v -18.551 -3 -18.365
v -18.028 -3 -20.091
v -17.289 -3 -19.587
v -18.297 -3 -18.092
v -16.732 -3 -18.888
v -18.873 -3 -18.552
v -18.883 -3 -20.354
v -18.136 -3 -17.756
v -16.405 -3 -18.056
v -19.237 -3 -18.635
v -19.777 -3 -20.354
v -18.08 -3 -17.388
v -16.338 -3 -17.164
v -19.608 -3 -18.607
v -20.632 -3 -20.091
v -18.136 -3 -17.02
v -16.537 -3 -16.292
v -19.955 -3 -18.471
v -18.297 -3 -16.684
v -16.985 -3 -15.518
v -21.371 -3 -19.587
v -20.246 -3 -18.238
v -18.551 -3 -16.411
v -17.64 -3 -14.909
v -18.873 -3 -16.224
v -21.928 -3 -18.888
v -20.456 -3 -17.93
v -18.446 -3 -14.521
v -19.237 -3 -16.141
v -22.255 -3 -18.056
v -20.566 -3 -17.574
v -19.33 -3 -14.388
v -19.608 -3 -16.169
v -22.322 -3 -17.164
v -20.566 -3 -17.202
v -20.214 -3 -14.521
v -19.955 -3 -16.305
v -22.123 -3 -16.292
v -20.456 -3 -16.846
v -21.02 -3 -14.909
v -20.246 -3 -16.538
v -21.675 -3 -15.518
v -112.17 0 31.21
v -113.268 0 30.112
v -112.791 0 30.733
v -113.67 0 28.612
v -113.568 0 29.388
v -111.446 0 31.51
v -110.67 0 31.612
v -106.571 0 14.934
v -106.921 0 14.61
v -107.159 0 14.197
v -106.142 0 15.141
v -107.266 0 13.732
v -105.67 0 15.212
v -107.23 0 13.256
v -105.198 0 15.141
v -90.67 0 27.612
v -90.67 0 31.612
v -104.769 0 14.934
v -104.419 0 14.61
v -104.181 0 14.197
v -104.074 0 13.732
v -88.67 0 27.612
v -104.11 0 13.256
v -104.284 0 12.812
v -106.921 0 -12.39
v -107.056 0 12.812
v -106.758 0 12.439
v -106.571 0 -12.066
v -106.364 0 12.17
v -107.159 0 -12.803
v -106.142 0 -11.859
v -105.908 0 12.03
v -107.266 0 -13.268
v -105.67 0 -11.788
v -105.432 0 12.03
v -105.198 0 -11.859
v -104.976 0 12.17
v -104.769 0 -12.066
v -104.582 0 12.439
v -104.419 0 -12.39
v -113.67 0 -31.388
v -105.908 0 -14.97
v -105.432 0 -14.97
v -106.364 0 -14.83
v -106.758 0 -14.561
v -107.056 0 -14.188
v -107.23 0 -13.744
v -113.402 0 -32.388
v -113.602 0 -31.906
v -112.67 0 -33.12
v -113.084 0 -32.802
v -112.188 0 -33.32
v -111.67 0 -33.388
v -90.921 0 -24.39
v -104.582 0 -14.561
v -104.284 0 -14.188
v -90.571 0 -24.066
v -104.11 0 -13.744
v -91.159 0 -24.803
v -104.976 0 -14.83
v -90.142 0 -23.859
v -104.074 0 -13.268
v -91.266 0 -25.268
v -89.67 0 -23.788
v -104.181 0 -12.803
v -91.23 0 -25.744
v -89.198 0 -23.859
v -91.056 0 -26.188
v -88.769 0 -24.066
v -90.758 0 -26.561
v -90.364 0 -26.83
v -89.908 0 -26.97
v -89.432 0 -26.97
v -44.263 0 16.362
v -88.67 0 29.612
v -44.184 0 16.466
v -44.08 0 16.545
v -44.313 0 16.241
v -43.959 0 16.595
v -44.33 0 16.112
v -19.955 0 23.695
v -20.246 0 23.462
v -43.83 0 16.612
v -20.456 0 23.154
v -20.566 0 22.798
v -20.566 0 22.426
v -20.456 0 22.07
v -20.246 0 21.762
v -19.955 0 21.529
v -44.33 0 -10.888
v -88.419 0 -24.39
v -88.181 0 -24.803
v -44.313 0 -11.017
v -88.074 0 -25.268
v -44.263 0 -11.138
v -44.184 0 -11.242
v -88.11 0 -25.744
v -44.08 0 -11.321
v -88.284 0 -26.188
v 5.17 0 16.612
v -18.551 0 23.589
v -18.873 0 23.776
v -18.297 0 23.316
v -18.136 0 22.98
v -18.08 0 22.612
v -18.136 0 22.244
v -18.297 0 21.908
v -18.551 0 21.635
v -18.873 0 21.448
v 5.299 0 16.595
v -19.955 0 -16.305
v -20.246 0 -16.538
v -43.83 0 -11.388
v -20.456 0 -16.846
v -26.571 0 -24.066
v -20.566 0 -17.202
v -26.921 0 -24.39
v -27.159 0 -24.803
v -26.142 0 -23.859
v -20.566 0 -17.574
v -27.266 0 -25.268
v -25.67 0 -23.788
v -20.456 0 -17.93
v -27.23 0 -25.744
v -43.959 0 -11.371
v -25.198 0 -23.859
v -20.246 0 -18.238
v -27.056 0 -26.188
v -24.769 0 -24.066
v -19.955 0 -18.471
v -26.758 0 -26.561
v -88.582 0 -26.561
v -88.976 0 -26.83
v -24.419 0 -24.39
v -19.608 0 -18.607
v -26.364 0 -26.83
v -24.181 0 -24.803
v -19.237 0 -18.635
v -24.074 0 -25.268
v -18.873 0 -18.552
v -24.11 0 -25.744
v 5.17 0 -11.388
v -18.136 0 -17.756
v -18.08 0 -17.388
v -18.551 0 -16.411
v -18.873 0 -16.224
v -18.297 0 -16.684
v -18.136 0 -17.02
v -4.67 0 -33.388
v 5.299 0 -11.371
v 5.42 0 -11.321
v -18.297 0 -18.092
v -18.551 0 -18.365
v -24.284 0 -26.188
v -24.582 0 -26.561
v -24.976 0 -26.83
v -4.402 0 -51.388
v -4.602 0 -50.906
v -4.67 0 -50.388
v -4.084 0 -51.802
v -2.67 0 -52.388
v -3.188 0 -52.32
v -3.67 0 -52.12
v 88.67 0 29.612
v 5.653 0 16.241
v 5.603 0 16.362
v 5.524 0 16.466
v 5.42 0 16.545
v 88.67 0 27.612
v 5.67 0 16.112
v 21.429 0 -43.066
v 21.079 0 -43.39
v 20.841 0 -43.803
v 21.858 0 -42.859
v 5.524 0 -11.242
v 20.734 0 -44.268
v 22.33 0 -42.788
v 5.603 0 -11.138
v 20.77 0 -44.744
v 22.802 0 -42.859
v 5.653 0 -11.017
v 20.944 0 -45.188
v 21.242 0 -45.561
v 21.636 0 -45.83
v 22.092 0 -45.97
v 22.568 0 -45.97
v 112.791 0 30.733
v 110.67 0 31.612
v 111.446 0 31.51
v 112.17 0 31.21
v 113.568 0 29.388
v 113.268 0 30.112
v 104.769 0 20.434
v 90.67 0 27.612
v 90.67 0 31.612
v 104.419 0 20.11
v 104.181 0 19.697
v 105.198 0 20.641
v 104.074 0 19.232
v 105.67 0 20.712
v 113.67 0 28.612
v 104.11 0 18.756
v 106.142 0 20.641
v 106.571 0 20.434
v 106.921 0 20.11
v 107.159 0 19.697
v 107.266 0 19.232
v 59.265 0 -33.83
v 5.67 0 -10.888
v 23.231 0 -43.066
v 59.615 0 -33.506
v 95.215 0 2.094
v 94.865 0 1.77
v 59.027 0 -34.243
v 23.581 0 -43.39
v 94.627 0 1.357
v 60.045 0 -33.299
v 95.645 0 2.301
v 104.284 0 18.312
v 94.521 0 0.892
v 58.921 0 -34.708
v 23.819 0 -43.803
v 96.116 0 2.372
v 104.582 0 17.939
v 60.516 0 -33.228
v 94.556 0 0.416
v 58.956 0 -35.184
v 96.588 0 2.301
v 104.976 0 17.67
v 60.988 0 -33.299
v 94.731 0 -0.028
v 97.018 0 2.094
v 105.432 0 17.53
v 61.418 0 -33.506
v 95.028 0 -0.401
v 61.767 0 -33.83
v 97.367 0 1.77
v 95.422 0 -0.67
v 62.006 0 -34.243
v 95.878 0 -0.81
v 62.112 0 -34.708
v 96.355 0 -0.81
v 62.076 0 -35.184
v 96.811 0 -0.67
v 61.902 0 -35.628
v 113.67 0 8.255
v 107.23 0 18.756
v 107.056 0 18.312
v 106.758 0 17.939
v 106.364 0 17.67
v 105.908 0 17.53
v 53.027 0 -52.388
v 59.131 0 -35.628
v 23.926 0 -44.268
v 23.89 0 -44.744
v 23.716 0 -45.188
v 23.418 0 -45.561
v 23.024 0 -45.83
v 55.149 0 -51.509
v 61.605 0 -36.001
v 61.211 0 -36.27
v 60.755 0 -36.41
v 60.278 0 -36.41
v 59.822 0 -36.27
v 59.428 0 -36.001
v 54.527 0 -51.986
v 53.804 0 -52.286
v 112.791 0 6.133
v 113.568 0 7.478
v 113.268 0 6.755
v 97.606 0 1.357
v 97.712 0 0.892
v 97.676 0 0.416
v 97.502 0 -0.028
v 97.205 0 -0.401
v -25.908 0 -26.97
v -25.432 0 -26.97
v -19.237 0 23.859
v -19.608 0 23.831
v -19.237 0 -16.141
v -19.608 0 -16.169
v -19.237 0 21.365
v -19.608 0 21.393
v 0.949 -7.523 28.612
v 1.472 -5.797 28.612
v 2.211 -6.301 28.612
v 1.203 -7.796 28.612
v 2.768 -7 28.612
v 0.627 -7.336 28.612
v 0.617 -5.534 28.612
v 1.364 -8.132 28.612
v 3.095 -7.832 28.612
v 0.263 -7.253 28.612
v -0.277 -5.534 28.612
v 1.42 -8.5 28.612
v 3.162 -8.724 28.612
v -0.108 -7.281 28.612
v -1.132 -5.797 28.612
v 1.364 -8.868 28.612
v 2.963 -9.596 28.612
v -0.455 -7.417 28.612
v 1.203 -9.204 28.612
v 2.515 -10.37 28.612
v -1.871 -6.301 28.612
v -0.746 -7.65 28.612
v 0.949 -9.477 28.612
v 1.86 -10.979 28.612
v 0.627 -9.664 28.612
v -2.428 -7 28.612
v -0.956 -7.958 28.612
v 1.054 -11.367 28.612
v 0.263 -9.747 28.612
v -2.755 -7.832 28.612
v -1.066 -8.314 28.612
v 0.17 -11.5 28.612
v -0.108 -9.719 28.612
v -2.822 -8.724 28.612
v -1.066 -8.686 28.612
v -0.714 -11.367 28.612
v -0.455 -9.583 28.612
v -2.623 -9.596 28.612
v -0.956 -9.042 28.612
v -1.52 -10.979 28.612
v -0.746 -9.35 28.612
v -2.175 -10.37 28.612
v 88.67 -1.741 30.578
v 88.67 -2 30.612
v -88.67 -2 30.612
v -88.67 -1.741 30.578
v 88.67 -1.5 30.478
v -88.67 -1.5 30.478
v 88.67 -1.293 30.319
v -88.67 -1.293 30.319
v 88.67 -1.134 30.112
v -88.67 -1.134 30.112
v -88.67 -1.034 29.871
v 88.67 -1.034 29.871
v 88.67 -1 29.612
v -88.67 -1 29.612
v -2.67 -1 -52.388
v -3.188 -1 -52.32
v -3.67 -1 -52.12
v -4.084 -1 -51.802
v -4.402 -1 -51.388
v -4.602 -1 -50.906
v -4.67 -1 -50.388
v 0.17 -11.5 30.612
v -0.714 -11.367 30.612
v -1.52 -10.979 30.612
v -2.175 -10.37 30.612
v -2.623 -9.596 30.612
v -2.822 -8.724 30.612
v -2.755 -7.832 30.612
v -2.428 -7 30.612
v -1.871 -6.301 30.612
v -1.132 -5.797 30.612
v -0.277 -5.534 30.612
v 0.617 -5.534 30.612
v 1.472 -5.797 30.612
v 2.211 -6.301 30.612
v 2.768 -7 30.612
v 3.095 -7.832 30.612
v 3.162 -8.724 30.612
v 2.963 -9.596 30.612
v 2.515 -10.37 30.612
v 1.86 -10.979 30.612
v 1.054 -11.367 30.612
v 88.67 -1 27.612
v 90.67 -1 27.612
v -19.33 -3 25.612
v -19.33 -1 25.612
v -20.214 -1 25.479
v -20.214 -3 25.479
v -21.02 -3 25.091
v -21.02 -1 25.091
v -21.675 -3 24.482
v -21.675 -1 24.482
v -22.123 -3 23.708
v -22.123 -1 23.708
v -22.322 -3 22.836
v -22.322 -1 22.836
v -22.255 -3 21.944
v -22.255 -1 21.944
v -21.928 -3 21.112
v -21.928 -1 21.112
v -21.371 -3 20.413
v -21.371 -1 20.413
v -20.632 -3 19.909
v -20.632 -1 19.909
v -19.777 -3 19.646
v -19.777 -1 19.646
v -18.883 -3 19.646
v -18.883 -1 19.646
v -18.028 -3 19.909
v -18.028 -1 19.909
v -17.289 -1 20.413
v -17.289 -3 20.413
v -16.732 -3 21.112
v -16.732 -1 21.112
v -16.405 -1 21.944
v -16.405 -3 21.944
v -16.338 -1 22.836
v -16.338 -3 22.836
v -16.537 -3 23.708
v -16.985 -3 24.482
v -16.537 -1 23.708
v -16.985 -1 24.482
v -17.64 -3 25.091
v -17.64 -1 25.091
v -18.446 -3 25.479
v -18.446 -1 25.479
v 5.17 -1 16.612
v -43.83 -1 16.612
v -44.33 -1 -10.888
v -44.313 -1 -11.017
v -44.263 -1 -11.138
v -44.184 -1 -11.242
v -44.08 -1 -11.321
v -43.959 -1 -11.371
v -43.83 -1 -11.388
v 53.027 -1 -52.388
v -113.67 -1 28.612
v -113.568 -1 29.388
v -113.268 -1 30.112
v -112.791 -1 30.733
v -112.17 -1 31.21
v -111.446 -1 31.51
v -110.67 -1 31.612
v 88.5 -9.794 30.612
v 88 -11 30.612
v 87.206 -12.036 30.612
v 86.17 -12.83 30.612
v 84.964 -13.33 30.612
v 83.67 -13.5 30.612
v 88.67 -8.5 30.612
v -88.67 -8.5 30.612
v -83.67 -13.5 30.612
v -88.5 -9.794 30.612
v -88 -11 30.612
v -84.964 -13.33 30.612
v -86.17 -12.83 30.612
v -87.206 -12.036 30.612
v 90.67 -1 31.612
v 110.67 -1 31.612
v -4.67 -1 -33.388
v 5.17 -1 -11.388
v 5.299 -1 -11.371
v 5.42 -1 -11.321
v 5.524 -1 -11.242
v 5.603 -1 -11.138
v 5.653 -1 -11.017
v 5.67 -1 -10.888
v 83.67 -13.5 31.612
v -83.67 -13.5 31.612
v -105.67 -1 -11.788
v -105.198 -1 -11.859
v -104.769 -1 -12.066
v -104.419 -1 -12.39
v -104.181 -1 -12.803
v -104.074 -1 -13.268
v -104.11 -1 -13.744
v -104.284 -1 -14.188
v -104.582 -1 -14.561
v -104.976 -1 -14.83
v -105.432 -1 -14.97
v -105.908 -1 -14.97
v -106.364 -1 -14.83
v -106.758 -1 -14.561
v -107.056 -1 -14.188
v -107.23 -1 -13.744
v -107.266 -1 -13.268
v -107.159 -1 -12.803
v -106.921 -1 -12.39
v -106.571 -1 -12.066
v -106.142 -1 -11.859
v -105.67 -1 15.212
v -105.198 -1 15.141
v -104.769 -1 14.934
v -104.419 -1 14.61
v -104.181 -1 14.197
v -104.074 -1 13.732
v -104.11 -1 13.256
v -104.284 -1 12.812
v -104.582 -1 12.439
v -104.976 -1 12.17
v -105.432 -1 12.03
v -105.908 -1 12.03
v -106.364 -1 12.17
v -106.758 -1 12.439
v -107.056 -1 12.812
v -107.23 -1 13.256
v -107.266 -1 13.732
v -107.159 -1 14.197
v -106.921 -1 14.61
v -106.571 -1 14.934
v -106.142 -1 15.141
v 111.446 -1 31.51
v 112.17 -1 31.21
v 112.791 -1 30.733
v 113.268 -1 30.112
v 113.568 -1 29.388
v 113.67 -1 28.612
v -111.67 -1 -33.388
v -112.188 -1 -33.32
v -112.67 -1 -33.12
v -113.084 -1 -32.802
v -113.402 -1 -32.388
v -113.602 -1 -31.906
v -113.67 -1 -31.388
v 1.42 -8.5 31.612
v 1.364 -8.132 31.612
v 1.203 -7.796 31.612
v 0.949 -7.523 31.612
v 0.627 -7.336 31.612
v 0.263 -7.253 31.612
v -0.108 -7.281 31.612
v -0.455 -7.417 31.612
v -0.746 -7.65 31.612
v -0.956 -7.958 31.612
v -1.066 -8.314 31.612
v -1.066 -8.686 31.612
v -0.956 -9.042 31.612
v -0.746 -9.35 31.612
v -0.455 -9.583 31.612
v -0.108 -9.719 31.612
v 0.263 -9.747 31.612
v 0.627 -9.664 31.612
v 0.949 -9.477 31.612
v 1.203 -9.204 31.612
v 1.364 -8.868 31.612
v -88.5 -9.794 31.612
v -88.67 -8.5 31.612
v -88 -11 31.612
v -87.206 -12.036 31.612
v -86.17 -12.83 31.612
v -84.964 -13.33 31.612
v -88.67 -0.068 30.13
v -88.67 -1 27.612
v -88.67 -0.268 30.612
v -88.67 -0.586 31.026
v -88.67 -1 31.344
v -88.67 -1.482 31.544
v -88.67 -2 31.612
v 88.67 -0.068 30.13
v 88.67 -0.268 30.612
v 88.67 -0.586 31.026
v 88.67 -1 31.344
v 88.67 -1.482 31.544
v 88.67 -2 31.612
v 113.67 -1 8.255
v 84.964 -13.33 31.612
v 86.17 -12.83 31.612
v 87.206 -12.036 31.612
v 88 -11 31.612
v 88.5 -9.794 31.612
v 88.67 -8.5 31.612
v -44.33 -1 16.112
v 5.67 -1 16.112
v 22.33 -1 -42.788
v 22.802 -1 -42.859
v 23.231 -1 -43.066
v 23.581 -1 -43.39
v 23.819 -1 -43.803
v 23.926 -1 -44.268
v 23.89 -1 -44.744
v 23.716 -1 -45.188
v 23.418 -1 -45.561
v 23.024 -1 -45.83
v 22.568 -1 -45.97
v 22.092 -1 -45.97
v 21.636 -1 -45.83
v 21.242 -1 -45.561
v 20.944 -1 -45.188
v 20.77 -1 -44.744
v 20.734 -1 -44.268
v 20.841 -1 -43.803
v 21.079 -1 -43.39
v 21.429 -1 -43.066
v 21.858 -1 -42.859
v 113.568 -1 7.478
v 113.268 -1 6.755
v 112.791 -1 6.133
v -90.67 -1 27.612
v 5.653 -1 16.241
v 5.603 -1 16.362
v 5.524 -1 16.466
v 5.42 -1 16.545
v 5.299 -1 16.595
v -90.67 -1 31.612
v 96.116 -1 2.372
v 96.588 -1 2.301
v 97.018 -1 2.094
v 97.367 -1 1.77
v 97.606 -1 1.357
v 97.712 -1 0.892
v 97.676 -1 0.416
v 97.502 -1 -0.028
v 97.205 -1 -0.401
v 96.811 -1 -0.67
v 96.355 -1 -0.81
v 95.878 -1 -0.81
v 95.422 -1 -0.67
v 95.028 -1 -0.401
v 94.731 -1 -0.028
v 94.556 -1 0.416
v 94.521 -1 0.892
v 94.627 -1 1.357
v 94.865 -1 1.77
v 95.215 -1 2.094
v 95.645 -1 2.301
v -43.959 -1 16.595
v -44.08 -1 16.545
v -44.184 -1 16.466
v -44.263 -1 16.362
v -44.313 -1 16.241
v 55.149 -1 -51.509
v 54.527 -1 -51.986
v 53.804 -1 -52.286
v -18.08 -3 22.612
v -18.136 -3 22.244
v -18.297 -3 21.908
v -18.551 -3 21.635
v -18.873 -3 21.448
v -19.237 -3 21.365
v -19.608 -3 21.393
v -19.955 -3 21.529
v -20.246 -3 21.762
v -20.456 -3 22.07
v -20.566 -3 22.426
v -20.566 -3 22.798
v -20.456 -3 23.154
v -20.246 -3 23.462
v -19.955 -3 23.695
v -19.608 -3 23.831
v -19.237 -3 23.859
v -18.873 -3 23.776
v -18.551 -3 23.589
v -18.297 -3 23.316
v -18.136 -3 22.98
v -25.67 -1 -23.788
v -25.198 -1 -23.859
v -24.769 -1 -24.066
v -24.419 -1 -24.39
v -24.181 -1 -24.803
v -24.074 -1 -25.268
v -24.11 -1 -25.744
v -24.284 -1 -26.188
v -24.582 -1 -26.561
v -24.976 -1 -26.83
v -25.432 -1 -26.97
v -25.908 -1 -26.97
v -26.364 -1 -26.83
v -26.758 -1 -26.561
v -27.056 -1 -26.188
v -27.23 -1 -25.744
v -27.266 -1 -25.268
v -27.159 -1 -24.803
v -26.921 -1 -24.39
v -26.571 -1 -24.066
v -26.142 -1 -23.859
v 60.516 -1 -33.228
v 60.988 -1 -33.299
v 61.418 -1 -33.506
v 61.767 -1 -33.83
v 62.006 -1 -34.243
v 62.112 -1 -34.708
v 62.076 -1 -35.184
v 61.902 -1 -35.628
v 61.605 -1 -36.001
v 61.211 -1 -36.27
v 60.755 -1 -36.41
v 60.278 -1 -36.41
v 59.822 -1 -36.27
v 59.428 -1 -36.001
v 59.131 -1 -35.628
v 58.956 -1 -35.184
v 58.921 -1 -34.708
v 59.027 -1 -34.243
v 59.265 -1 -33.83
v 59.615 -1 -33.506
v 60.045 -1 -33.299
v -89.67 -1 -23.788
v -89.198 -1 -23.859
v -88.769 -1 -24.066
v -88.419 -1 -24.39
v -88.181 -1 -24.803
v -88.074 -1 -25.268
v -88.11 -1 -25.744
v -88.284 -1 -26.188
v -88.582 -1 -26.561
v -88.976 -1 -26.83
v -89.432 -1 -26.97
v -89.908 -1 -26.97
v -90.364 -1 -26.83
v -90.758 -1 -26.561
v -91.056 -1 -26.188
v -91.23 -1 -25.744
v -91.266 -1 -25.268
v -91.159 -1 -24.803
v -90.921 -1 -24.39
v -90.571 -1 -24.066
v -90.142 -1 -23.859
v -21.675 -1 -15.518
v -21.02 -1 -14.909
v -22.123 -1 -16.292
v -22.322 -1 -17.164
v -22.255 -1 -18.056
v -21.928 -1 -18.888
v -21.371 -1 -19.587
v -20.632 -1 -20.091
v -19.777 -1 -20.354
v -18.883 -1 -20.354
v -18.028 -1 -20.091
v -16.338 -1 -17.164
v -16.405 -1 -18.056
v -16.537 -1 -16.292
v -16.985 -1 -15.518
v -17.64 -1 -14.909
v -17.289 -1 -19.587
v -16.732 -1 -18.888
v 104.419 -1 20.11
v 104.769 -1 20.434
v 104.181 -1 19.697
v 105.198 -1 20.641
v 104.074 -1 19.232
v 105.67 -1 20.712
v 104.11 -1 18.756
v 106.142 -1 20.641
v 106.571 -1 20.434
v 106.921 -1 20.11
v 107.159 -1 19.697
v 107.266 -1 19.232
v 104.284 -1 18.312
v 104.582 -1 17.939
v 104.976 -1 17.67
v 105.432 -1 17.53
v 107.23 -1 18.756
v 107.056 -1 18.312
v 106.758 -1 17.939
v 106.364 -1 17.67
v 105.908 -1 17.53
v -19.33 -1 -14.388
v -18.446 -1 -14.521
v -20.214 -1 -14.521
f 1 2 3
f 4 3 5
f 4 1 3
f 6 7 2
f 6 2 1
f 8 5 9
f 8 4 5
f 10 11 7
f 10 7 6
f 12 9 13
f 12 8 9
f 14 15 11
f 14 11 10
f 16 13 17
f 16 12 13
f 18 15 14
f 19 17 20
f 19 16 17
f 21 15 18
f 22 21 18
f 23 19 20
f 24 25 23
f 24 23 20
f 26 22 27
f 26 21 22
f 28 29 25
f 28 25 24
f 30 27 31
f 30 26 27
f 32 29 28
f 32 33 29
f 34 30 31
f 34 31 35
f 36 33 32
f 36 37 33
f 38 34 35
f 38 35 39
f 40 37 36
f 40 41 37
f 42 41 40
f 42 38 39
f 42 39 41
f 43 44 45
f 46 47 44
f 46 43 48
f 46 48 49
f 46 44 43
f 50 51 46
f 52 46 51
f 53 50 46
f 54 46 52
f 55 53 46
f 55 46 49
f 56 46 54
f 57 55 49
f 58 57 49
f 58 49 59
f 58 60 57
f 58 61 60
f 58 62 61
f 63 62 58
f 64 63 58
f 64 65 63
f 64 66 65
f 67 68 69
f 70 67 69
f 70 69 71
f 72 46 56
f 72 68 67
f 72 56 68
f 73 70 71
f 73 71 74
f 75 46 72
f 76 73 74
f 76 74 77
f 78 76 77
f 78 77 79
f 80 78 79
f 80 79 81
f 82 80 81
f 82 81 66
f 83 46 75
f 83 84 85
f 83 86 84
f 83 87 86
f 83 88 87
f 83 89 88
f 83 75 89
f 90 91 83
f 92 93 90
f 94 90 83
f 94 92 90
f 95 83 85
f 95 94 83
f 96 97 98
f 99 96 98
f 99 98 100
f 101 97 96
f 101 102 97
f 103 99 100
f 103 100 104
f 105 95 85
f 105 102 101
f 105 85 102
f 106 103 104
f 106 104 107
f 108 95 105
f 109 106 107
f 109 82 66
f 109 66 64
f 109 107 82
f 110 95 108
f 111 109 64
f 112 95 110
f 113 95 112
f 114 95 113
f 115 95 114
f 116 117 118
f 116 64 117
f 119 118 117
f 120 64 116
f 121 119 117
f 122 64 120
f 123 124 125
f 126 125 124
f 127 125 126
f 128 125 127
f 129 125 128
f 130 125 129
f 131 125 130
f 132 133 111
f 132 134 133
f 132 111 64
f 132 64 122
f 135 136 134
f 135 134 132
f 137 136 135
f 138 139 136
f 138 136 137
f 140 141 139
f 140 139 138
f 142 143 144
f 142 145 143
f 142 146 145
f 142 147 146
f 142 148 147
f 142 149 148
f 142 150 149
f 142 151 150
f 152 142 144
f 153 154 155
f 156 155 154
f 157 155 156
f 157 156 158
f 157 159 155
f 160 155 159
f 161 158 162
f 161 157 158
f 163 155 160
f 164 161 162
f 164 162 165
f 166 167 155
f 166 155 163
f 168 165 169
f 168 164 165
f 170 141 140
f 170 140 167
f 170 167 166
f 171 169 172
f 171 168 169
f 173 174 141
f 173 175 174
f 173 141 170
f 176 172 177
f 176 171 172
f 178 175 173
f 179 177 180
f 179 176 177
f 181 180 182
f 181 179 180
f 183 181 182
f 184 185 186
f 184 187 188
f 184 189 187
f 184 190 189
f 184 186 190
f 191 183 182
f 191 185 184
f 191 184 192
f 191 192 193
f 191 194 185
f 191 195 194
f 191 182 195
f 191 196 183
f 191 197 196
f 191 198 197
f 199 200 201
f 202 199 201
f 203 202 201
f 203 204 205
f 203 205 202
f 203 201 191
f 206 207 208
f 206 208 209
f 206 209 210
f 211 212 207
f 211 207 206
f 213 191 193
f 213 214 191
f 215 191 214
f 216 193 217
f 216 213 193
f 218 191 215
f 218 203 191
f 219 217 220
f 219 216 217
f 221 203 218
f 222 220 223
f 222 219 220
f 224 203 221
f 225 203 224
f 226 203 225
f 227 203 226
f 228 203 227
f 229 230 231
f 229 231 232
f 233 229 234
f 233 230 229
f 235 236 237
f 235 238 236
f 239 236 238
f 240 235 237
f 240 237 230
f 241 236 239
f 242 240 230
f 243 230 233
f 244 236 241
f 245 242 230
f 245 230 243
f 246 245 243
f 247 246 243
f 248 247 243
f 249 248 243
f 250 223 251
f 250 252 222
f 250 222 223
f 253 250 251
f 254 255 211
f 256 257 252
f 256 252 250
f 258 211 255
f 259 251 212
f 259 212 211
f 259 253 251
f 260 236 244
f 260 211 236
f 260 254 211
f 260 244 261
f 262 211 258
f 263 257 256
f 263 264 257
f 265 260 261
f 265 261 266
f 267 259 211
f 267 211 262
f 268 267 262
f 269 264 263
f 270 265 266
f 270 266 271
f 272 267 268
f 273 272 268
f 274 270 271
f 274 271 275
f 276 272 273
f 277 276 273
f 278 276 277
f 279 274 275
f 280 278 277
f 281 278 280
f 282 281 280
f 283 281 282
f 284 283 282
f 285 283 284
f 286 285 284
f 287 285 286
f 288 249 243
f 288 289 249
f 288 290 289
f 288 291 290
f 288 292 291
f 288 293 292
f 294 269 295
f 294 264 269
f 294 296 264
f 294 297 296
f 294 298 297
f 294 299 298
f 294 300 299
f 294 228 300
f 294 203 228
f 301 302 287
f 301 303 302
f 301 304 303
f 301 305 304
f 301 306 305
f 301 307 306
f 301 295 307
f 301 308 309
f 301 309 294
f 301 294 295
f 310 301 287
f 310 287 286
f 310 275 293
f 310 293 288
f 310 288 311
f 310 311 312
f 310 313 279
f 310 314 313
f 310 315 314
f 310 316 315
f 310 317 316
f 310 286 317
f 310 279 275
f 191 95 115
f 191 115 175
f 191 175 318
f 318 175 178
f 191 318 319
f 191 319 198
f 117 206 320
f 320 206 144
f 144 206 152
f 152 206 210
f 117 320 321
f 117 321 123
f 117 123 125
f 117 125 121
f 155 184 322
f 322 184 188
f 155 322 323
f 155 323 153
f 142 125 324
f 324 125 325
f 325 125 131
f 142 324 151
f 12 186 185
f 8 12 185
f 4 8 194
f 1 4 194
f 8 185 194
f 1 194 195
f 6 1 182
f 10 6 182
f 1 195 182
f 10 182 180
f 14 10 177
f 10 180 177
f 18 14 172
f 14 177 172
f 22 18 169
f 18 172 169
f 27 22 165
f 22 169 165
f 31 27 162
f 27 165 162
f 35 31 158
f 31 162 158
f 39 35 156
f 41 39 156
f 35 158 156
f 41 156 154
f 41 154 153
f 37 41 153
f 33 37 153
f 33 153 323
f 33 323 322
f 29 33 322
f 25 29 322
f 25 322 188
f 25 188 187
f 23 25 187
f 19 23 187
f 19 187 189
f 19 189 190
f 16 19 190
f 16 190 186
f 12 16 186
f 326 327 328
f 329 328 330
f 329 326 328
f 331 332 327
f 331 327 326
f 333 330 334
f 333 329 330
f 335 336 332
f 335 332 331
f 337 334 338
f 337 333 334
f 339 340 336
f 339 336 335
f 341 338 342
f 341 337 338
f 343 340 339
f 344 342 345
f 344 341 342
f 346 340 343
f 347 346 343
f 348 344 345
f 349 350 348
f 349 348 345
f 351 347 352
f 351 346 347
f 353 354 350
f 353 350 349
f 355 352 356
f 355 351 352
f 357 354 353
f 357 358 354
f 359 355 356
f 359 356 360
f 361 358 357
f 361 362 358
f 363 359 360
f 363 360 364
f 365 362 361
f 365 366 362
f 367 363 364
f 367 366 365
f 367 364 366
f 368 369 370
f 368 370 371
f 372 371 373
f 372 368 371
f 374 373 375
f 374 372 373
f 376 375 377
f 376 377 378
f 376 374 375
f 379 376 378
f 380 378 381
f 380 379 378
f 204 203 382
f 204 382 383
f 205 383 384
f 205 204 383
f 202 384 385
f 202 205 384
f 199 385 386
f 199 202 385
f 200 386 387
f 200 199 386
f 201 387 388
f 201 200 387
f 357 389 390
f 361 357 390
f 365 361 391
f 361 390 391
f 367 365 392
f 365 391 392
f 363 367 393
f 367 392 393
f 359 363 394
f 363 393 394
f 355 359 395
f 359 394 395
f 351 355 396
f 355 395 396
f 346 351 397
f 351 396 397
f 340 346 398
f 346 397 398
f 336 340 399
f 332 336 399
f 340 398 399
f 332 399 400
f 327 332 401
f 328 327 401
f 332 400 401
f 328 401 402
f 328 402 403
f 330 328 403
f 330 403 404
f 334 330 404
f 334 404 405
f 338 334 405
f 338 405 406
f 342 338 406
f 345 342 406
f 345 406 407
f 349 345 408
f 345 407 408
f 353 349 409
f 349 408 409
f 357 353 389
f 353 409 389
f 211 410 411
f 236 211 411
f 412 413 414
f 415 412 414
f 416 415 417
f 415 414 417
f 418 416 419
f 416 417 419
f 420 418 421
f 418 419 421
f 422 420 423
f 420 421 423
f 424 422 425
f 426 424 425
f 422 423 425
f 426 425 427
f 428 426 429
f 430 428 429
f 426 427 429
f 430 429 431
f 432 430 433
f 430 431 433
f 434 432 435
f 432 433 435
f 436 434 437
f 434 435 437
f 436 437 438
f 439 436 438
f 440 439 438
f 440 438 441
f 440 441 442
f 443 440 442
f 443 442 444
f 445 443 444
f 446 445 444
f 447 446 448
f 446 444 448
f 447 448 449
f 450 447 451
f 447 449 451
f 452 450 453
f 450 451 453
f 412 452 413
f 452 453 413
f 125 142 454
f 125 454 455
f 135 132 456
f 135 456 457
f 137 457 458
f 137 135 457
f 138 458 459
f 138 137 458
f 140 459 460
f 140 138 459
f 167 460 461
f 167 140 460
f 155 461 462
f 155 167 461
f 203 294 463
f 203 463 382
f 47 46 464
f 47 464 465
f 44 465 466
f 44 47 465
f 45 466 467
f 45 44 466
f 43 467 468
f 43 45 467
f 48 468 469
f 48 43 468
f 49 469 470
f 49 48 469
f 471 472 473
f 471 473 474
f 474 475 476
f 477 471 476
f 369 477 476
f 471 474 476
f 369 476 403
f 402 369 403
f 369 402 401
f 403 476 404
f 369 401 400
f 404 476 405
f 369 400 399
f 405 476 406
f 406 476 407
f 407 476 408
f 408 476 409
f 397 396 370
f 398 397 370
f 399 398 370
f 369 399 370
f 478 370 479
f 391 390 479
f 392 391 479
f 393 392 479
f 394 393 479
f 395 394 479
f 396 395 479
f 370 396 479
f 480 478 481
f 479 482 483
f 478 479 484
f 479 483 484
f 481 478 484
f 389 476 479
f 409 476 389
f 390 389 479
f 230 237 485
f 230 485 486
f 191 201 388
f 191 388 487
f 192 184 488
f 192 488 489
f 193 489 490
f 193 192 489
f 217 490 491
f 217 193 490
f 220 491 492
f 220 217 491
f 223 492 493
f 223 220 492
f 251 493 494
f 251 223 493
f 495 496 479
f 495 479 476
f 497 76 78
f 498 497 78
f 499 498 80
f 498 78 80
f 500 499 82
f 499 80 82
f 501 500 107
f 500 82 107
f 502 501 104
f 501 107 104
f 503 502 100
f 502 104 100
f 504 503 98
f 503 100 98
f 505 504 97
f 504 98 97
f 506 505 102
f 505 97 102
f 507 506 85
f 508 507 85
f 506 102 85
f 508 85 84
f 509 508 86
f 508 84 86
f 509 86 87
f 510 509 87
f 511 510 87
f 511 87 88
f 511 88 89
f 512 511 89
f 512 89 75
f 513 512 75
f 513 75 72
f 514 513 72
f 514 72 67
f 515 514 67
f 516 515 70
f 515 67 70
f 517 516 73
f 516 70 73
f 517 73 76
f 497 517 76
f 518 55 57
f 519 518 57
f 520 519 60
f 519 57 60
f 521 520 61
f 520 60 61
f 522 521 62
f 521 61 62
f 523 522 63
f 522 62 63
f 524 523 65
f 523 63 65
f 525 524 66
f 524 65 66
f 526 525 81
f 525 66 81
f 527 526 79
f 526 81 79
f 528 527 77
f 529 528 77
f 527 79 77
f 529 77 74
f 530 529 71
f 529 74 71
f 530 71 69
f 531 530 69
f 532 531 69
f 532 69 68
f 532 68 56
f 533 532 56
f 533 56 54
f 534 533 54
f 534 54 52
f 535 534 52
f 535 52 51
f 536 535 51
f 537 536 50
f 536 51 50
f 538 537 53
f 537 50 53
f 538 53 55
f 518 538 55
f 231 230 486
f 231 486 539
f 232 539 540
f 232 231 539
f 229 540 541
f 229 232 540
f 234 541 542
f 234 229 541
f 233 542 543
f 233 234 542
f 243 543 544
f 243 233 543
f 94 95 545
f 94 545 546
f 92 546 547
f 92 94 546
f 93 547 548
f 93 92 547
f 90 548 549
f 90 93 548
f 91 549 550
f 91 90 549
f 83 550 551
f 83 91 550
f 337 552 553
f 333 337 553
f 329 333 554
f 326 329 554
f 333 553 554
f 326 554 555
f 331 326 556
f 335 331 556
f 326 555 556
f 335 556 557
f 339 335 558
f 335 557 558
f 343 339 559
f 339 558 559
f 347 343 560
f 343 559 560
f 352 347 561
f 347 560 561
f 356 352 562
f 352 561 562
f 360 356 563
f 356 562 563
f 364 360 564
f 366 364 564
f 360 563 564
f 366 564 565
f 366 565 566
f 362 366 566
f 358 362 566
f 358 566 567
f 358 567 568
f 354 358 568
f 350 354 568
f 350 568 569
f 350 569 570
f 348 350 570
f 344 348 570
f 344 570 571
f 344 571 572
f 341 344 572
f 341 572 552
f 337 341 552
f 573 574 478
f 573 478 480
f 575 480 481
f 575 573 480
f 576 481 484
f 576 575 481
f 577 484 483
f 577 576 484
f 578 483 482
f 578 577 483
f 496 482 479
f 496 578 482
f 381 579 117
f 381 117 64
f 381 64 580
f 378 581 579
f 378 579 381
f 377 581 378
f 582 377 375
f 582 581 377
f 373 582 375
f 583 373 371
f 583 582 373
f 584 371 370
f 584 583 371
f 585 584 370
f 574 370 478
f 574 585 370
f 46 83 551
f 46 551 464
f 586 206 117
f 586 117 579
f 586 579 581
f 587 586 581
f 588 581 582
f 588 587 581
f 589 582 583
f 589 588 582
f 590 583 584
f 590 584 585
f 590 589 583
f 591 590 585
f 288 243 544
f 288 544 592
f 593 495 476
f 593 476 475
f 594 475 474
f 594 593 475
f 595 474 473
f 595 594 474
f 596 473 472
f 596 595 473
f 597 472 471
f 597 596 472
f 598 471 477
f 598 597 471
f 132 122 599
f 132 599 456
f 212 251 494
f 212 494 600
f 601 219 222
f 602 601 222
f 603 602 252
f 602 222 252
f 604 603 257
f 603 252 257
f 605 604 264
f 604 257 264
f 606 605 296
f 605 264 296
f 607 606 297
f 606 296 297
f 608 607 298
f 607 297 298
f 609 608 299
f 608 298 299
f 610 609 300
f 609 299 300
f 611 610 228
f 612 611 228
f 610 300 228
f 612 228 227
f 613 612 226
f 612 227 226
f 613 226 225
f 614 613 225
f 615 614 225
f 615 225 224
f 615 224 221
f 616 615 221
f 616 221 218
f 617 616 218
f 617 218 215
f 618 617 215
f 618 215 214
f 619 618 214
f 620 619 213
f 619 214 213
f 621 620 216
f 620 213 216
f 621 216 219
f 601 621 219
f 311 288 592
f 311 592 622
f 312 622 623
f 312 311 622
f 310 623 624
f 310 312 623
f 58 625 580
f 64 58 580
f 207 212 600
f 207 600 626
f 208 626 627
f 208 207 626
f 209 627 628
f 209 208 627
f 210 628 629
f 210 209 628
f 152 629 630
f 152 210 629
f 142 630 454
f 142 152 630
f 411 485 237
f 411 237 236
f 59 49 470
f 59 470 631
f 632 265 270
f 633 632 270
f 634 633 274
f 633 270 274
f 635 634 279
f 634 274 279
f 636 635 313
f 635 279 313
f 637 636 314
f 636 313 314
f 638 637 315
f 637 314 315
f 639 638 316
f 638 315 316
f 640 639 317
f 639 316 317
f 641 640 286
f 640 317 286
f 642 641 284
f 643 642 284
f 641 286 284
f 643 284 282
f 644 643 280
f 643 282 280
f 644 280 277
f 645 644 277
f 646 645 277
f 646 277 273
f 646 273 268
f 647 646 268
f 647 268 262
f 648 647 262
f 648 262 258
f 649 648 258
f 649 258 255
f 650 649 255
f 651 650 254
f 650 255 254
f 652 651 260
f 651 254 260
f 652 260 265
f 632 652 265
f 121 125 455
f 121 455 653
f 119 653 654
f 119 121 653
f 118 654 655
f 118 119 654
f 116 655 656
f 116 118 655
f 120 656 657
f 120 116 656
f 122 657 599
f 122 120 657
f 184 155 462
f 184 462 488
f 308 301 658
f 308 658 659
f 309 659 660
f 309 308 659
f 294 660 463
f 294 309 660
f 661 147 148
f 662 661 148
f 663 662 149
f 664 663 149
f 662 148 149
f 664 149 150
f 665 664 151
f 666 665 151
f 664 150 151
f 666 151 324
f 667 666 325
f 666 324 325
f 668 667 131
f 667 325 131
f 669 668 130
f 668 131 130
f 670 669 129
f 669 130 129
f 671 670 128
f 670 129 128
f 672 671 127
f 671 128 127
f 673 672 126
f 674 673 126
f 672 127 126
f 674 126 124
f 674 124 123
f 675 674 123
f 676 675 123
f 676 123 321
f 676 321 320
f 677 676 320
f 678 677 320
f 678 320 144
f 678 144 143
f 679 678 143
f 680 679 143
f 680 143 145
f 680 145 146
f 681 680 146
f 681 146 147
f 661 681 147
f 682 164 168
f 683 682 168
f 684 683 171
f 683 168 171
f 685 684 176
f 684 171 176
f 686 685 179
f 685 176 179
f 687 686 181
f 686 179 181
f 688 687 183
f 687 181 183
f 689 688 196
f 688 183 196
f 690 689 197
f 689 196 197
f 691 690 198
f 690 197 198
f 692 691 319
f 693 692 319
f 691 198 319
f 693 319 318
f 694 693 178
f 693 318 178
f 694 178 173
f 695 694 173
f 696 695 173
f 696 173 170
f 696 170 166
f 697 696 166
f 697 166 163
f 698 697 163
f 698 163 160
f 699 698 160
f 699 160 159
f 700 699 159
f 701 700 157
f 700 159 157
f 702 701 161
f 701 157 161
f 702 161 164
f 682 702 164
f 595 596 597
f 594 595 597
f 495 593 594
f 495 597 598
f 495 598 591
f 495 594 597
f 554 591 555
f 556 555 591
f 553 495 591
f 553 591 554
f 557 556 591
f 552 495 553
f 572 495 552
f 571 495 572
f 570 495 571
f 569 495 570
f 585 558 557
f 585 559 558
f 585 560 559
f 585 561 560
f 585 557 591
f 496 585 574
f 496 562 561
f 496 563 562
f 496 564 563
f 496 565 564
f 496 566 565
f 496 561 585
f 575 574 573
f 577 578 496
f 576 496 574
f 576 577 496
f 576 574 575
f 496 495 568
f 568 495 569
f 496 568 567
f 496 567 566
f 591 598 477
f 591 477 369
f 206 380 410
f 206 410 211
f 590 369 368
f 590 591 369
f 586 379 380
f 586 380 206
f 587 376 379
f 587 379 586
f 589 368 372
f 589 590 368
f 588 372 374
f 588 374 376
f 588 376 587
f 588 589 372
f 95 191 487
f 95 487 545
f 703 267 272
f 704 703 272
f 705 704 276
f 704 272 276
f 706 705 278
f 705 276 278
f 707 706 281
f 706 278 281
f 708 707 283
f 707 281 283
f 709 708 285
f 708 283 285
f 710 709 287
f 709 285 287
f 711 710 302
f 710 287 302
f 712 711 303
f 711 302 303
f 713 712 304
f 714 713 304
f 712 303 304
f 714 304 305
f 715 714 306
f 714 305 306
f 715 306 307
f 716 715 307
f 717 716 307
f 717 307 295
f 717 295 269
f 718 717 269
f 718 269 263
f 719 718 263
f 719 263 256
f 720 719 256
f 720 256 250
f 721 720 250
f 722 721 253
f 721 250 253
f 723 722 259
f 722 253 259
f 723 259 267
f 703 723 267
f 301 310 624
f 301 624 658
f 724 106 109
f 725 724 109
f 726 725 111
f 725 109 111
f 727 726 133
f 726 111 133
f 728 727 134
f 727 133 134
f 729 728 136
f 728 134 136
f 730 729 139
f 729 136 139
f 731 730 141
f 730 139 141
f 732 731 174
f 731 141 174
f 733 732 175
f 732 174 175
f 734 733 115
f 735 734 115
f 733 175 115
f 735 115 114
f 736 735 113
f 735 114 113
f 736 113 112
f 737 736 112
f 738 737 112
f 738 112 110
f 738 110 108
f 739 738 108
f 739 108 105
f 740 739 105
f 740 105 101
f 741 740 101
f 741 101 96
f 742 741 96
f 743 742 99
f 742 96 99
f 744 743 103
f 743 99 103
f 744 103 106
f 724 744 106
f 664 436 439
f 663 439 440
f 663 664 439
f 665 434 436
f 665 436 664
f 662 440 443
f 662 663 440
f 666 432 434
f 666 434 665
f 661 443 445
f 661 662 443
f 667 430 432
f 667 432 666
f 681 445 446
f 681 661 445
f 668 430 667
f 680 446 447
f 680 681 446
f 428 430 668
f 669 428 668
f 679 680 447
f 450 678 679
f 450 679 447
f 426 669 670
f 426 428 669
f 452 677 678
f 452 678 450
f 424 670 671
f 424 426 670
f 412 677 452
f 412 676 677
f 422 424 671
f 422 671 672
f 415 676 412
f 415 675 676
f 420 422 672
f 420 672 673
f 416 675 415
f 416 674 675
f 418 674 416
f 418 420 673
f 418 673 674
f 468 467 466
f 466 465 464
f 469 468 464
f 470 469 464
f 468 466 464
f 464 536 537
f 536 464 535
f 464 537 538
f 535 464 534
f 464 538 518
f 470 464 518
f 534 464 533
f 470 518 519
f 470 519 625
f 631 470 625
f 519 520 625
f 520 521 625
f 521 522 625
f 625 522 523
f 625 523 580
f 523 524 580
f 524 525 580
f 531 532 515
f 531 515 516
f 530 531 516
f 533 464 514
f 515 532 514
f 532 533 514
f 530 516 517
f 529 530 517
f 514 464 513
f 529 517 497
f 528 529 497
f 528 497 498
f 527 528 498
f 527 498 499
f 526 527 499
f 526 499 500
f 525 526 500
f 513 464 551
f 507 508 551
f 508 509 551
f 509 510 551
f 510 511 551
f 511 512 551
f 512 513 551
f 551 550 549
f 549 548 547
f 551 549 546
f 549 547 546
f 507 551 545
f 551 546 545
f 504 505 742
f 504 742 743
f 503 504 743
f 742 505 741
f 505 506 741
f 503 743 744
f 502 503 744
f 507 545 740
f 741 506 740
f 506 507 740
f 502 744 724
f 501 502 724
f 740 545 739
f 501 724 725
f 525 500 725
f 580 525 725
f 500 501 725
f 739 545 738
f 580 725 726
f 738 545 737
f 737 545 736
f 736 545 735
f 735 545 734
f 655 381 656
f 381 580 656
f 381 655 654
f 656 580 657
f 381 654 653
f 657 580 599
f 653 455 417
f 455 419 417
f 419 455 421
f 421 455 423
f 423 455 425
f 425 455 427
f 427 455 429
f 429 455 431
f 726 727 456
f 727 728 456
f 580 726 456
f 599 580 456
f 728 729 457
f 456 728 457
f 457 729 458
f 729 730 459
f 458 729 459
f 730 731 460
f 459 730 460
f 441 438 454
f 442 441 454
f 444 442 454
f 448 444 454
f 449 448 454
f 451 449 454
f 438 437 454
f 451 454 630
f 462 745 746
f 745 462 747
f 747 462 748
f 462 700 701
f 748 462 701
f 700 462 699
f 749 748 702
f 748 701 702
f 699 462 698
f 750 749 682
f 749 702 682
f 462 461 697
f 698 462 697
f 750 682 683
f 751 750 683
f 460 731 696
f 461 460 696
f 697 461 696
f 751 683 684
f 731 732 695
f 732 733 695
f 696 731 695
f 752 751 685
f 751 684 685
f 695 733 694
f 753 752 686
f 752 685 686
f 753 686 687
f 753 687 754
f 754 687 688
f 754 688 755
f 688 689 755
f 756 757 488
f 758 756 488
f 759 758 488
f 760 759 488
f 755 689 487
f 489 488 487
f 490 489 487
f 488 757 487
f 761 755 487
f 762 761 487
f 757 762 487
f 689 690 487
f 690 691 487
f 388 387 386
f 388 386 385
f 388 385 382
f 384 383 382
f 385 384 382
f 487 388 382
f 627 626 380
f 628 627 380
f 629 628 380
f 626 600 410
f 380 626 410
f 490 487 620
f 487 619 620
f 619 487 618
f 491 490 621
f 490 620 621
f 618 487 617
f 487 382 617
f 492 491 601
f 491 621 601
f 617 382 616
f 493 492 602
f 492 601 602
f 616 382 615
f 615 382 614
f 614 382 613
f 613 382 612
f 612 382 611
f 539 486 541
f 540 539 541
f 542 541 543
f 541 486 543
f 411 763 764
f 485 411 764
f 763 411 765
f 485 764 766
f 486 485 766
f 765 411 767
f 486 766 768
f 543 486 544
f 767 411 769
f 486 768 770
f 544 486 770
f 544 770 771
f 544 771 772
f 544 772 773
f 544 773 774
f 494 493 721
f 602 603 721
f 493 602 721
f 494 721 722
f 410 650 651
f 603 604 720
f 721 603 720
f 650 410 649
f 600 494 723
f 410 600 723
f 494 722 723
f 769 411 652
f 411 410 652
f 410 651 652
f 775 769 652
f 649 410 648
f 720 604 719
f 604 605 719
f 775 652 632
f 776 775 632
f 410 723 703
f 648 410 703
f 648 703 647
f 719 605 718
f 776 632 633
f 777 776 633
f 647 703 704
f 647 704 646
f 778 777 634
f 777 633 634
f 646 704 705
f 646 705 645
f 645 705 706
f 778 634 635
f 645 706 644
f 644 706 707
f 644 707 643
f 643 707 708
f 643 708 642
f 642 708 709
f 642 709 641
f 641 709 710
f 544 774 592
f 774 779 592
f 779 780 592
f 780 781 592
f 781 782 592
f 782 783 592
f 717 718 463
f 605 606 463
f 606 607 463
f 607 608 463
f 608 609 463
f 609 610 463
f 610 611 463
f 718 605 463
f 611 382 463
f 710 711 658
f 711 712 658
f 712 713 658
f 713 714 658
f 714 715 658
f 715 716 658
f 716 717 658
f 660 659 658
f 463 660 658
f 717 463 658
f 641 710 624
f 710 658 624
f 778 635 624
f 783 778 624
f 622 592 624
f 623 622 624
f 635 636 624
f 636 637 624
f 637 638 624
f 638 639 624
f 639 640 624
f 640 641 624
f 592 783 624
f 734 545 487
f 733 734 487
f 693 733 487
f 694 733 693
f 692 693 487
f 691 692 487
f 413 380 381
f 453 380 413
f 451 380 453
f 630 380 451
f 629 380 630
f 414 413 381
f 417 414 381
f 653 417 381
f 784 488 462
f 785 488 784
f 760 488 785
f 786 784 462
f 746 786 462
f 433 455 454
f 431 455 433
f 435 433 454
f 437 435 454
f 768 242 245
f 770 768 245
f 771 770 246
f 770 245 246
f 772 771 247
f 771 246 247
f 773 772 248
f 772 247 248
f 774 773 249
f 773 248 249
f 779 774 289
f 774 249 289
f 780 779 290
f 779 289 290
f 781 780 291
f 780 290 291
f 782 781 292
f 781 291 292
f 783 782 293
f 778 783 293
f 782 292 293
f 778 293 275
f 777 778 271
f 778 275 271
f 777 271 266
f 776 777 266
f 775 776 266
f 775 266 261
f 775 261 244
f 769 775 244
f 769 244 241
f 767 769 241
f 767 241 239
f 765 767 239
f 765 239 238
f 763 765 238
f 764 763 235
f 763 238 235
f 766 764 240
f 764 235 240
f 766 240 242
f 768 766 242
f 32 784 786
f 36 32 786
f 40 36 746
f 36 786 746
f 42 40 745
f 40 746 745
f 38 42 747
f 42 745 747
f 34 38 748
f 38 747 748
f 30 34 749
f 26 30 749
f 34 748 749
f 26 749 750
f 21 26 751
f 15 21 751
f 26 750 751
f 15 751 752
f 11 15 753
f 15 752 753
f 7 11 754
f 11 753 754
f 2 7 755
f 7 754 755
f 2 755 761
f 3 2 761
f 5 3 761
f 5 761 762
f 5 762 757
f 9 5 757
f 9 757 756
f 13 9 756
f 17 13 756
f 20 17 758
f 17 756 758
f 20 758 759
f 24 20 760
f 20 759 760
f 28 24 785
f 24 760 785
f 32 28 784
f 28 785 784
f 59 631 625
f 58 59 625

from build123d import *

# Parameters (mm, degrees)
SKETCH_1_R                        = 1.6
SM_BASE_FLANGE_1_DEPTH            = 1
SKETCH_2_R                        = 3
EXTRUDE_1_DEPTH                   = 2
HOLE_WIZARD_M3_1_D                = 2.5
SM_EDGE_FLANGE_1_STRIP_W          = 6
SM_EDGE_FLANGE_1_STRIP_H          = 1
SM_EDGE_FLANGE_1_STRIP_CUT_DEPTH  = 177.34
SM_EDGE_FLANGE_1_RELIEF_W         = 8
SM_EDGE_FLANGE_1_RELIEF_H         = 2
SM_EDGE_FLANGE_1_RELIEF_CUT_DEPTH = 1
SM_EDGE_FLANGE_1_DEPTH            = 177.34
SM_EDGE_FLANGE_1_FLAT_DEPTH       = 1
SKETCH_8_R                        = 3
EXTRUDE_2_DEPTH                   = 2
HOLE_WIZARD_M3_2_D                = 2.5


# Sheet-metal steps are written as plain solids
with BuildPart() as part:
    # Sketch 1 → 基体-法兰1 (new body)
    with BuildSketch(Plane(origin=(0, 0, 0), x_dir=(1, 0, 0), z_dir=(0, 1, 0))):
        with BuildLine():
            Line((-113.67, 31.388001247), (-113.67, -28.611998753))
            ThreePointArc((-113.67, -28.611998753), (-112.791320344, -30.733319096), (-110.67, -31.611998753))
            Line((-110.67, -31.611998753), (110.67, -31.611998753))
            ThreePointArc((110.67, -31.611998753), (112.791320344, -30.733319096), (113.67, -28.611998753))
            Line((113.67, -28.611998753), (113.67, -8.25463944))
            ThreePointArc((113.67, -8.25463944), (113.441638598, -7.106589143), (112.791320344, -6.133319096))
            Line((112.791320344, -6.133319096), (55.148679656, 51.509321591))
            ThreePointArc((55.148679656, 51.509321591), (54.17540961, 52.159639845), (53.027359313, 52.388001247))
            Line((53.027359313, 52.388001247), (-2.67, 52.388001247))
            ThreePointArc((-2.67, 52.388001247), (-4.084213562, 51.80221481), (-4.67, 50.388001247))
            Line((-4.67, 50.388001247), (-4.67, 33.388001247))
            Line((-4.67, 33.388001247), (-111.67, 33.388001247))
            ThreePointArc((-111.67, 33.388001247), (-113.084213562, 32.80221481), (-113.67, 31.388001247))
        make_face()
        with Locations(Location((-105.67, -13.611998753, 0), (0, 0, 270))):
            Circle(SKETCH_1_R, mode=Mode.SUBTRACT)
        with Locations(Location((-105.67, 13.388001247, 0), (0, 0, 270))):
            Circle(SKETCH_1_R, mode=Mode.SUBTRACT)
        with Locations(Location((-89.67, 25.388001247, 0), (0, 0, 270))):
            Circle(SKETCH_1_R, mode=Mode.SUBTRACT)
        with Locations(Location((-25.67, 25.388001247, 0), (0, 0, 270))):
            Circle(SKETCH_1_R, mode=Mode.SUBTRACT)
        with Locations(Location((22.33, 44.388001247, 0), (0, 0, 270))):
            Circle(SKETCH_1_R, mode=Mode.SUBTRACT)
        with Locations(Location((60.516291501, 34.828001247, 0), (0, 0, 270))):
            Circle(SKETCH_1_R, mode=Mode.SUBTRACT)
        with Locations(Location((96.116291501, -0.771998753, 0), (0, 0, 270))):
            Circle(SKETCH_1_R, mode=Mode.SUBTRACT)
        with Locations(Location((105.67, -19.111998753, 0), (0, 0, 270))):
            Circle(SKETCH_1_R, mode=Mode.SUBTRACT)
        with BuildLine():
            Line((-43.83, 11.388001247), (5.17, 11.388001247))
            ThreePointArc((5.17, 11.388001247), (5.523553391, 11.241554638), (5.67, 10.888001247))
            Line((5.67, 10.888001247), (5.67, -16.111998753))
            ThreePointArc((5.67, -16.111998753), (5.523553391, -16.465552143), (5.17, -16.611998753))
            Line((5.17, -16.611998753), (-43.83, -16.611998753))
            ThreePointArc((-43.83, -16.611998753), (-44.183553391, -16.465552143), (-44.33, -16.111998753))
            Line((-44.33, -16.111998753), (-44.33, 10.888001247))
            ThreePointArc((-44.33, 10.888001247), (-44.183553391, 11.241554638), (-43.83, 11.388001247))
        make_face(mode=Mode.SUBTRACT)
    extrude(amount=-SM_BASE_FLANGE_1_DEPTH)

    # Sketch 2 → 凸台-拉伸1 (add)
    with BuildSketch(Plane.XZ.offset(1)):
        with Locations(Location((-19.33, -17.388001247, 0), (0, 0, 90))):
            Circle(SKETCH_2_R)
        with Locations(Location((-19.33, 22.611998753, 0), (0, 0, 90))):
            Circle(SKETCH_2_R)
    extrude(amount=EXTRUDE_1_DEPTH)

    # M3 螺纹孔1 (through all)
    with Locations(Plane(origin=(0, -3, 0), x_dir=(-1, 0, 0), z_dir=(0, -1, 0))):
        with Locations((19.33, 17.388001247), (19.33, -22.611998753)):
            Hole(HOLE_WIZARD_M3_1_D / 2)

    # 边线-法兰1 strip (across the edge) → 边线-法兰1 strip cut (cut)
    with BuildSketch(Plane(origin=(88.67, -1, 31.611998753), x_dir=(0, 0, -1), z_dir=(-1, 0, 0))):
        with Locations((-1, -0.5)):
            Rectangle(SM_EDGE_FLANGE_1_STRIP_W, SM_EDGE_FLANGE_1_STRIP_H)
    extrude(amount=SM_EDGE_FLANGE_1_STRIP_CUT_DEPTH, mode=Mode.SUBTRACT)

    # 边线-法兰1 relief (on the sheet) → 边线-法兰1 relief cut (cut)
    with BuildSketch(Plane(origin=(88.67, -1, 29.611998753), x_dir=(0, 0, -1), z_dir=(0, -1, 0))):
        with Locations((-2, 1)):
            Rectangle(SM_EDGE_FLANGE_1_RELIEF_W, SM_EDGE_FLANGE_1_RELIEF_H)
        with Locations((-2, -178.34)):
            Rectangle(SM_EDGE_FLANGE_1_RELIEF_W, SM_EDGE_FLANGE_1_RELIEF_H)
    extrude(amount=-SM_EDGE_FLANGE_1_RELIEF_CUT_DEPTH, mode=Mode.SUBTRACT)

    # 边线-法兰1 bend section (across the edge) → 边线-法兰1 (add)
    with BuildSketch(Plane(origin=(88.67, -1, 31.611998753), x_dir=(0, 0, -1), z_dir=(-1, 0, 0))):
        with BuildLine():
            Line((0, 1), (1, 1))
            ThreePointArc((1, 1), (1.292893219, 0.292893219), (2, 0))
            Line((2, 0), (2, -1))
            ThreePointArc((2, -1), (0.585786438, -0.414213562), (0, 1))
        make_face()
    extrude(amount=SM_EDGE_FLANGE_1_DEPTH)

    # 边线-法兰1 profile (on flange) → 边线-法兰1 flat (add)
    with BuildSketch(Plane(origin=(0, -1, 31.611998753), x_dir=(-1, 0, 0), z_dir=(0, 0, 1))):
        with BuildLine():
            Line((83.67, 12.5), (-83.67, 12.5))
            ThreePointArc((-83.67, 12.5), (-87.205533906, 11.035533906), (-88.67, 7.5))
            Line((-88.67, 7.5), (-88.67, 1))
            Line((-88.67, 1), (88.67, 1))
            Line((88.67, 1), (88.67, 7.5))
            ThreePointArc((88.67, 7.5), (87.205533906, 11.035533906), (83.67, 12.5))
        make_face()
    extrude(amount=-SM_EDGE_FLANGE_1_FLAT_DEPTH)

    # 草图8 → 凸台-拉伸2 (add)
    with BuildSketch(Plane(origin=(0, 0, 30.611998753), x_dir=(-1, 0, 0), z_dir=(0, 0, -1))):
        with Locations(Location((-0.17, -8.5, 0), (0, 0, 270))):
            Circle(SKETCH_8_R)
    extrude(amount=EXTRUDE_2_DEPTH)

    # M3 螺纹孔2 (through all)
    with Locations(Plane(origin=(0, 0, 28.611998753), x_dir=(-1, 0, 0), z_dir=(0, 0, -1))):
        with Locations((-0.17, -8.5)):
            Hole(HOLE_WIZARD_M3_2_D / 2)


solid = part.part
